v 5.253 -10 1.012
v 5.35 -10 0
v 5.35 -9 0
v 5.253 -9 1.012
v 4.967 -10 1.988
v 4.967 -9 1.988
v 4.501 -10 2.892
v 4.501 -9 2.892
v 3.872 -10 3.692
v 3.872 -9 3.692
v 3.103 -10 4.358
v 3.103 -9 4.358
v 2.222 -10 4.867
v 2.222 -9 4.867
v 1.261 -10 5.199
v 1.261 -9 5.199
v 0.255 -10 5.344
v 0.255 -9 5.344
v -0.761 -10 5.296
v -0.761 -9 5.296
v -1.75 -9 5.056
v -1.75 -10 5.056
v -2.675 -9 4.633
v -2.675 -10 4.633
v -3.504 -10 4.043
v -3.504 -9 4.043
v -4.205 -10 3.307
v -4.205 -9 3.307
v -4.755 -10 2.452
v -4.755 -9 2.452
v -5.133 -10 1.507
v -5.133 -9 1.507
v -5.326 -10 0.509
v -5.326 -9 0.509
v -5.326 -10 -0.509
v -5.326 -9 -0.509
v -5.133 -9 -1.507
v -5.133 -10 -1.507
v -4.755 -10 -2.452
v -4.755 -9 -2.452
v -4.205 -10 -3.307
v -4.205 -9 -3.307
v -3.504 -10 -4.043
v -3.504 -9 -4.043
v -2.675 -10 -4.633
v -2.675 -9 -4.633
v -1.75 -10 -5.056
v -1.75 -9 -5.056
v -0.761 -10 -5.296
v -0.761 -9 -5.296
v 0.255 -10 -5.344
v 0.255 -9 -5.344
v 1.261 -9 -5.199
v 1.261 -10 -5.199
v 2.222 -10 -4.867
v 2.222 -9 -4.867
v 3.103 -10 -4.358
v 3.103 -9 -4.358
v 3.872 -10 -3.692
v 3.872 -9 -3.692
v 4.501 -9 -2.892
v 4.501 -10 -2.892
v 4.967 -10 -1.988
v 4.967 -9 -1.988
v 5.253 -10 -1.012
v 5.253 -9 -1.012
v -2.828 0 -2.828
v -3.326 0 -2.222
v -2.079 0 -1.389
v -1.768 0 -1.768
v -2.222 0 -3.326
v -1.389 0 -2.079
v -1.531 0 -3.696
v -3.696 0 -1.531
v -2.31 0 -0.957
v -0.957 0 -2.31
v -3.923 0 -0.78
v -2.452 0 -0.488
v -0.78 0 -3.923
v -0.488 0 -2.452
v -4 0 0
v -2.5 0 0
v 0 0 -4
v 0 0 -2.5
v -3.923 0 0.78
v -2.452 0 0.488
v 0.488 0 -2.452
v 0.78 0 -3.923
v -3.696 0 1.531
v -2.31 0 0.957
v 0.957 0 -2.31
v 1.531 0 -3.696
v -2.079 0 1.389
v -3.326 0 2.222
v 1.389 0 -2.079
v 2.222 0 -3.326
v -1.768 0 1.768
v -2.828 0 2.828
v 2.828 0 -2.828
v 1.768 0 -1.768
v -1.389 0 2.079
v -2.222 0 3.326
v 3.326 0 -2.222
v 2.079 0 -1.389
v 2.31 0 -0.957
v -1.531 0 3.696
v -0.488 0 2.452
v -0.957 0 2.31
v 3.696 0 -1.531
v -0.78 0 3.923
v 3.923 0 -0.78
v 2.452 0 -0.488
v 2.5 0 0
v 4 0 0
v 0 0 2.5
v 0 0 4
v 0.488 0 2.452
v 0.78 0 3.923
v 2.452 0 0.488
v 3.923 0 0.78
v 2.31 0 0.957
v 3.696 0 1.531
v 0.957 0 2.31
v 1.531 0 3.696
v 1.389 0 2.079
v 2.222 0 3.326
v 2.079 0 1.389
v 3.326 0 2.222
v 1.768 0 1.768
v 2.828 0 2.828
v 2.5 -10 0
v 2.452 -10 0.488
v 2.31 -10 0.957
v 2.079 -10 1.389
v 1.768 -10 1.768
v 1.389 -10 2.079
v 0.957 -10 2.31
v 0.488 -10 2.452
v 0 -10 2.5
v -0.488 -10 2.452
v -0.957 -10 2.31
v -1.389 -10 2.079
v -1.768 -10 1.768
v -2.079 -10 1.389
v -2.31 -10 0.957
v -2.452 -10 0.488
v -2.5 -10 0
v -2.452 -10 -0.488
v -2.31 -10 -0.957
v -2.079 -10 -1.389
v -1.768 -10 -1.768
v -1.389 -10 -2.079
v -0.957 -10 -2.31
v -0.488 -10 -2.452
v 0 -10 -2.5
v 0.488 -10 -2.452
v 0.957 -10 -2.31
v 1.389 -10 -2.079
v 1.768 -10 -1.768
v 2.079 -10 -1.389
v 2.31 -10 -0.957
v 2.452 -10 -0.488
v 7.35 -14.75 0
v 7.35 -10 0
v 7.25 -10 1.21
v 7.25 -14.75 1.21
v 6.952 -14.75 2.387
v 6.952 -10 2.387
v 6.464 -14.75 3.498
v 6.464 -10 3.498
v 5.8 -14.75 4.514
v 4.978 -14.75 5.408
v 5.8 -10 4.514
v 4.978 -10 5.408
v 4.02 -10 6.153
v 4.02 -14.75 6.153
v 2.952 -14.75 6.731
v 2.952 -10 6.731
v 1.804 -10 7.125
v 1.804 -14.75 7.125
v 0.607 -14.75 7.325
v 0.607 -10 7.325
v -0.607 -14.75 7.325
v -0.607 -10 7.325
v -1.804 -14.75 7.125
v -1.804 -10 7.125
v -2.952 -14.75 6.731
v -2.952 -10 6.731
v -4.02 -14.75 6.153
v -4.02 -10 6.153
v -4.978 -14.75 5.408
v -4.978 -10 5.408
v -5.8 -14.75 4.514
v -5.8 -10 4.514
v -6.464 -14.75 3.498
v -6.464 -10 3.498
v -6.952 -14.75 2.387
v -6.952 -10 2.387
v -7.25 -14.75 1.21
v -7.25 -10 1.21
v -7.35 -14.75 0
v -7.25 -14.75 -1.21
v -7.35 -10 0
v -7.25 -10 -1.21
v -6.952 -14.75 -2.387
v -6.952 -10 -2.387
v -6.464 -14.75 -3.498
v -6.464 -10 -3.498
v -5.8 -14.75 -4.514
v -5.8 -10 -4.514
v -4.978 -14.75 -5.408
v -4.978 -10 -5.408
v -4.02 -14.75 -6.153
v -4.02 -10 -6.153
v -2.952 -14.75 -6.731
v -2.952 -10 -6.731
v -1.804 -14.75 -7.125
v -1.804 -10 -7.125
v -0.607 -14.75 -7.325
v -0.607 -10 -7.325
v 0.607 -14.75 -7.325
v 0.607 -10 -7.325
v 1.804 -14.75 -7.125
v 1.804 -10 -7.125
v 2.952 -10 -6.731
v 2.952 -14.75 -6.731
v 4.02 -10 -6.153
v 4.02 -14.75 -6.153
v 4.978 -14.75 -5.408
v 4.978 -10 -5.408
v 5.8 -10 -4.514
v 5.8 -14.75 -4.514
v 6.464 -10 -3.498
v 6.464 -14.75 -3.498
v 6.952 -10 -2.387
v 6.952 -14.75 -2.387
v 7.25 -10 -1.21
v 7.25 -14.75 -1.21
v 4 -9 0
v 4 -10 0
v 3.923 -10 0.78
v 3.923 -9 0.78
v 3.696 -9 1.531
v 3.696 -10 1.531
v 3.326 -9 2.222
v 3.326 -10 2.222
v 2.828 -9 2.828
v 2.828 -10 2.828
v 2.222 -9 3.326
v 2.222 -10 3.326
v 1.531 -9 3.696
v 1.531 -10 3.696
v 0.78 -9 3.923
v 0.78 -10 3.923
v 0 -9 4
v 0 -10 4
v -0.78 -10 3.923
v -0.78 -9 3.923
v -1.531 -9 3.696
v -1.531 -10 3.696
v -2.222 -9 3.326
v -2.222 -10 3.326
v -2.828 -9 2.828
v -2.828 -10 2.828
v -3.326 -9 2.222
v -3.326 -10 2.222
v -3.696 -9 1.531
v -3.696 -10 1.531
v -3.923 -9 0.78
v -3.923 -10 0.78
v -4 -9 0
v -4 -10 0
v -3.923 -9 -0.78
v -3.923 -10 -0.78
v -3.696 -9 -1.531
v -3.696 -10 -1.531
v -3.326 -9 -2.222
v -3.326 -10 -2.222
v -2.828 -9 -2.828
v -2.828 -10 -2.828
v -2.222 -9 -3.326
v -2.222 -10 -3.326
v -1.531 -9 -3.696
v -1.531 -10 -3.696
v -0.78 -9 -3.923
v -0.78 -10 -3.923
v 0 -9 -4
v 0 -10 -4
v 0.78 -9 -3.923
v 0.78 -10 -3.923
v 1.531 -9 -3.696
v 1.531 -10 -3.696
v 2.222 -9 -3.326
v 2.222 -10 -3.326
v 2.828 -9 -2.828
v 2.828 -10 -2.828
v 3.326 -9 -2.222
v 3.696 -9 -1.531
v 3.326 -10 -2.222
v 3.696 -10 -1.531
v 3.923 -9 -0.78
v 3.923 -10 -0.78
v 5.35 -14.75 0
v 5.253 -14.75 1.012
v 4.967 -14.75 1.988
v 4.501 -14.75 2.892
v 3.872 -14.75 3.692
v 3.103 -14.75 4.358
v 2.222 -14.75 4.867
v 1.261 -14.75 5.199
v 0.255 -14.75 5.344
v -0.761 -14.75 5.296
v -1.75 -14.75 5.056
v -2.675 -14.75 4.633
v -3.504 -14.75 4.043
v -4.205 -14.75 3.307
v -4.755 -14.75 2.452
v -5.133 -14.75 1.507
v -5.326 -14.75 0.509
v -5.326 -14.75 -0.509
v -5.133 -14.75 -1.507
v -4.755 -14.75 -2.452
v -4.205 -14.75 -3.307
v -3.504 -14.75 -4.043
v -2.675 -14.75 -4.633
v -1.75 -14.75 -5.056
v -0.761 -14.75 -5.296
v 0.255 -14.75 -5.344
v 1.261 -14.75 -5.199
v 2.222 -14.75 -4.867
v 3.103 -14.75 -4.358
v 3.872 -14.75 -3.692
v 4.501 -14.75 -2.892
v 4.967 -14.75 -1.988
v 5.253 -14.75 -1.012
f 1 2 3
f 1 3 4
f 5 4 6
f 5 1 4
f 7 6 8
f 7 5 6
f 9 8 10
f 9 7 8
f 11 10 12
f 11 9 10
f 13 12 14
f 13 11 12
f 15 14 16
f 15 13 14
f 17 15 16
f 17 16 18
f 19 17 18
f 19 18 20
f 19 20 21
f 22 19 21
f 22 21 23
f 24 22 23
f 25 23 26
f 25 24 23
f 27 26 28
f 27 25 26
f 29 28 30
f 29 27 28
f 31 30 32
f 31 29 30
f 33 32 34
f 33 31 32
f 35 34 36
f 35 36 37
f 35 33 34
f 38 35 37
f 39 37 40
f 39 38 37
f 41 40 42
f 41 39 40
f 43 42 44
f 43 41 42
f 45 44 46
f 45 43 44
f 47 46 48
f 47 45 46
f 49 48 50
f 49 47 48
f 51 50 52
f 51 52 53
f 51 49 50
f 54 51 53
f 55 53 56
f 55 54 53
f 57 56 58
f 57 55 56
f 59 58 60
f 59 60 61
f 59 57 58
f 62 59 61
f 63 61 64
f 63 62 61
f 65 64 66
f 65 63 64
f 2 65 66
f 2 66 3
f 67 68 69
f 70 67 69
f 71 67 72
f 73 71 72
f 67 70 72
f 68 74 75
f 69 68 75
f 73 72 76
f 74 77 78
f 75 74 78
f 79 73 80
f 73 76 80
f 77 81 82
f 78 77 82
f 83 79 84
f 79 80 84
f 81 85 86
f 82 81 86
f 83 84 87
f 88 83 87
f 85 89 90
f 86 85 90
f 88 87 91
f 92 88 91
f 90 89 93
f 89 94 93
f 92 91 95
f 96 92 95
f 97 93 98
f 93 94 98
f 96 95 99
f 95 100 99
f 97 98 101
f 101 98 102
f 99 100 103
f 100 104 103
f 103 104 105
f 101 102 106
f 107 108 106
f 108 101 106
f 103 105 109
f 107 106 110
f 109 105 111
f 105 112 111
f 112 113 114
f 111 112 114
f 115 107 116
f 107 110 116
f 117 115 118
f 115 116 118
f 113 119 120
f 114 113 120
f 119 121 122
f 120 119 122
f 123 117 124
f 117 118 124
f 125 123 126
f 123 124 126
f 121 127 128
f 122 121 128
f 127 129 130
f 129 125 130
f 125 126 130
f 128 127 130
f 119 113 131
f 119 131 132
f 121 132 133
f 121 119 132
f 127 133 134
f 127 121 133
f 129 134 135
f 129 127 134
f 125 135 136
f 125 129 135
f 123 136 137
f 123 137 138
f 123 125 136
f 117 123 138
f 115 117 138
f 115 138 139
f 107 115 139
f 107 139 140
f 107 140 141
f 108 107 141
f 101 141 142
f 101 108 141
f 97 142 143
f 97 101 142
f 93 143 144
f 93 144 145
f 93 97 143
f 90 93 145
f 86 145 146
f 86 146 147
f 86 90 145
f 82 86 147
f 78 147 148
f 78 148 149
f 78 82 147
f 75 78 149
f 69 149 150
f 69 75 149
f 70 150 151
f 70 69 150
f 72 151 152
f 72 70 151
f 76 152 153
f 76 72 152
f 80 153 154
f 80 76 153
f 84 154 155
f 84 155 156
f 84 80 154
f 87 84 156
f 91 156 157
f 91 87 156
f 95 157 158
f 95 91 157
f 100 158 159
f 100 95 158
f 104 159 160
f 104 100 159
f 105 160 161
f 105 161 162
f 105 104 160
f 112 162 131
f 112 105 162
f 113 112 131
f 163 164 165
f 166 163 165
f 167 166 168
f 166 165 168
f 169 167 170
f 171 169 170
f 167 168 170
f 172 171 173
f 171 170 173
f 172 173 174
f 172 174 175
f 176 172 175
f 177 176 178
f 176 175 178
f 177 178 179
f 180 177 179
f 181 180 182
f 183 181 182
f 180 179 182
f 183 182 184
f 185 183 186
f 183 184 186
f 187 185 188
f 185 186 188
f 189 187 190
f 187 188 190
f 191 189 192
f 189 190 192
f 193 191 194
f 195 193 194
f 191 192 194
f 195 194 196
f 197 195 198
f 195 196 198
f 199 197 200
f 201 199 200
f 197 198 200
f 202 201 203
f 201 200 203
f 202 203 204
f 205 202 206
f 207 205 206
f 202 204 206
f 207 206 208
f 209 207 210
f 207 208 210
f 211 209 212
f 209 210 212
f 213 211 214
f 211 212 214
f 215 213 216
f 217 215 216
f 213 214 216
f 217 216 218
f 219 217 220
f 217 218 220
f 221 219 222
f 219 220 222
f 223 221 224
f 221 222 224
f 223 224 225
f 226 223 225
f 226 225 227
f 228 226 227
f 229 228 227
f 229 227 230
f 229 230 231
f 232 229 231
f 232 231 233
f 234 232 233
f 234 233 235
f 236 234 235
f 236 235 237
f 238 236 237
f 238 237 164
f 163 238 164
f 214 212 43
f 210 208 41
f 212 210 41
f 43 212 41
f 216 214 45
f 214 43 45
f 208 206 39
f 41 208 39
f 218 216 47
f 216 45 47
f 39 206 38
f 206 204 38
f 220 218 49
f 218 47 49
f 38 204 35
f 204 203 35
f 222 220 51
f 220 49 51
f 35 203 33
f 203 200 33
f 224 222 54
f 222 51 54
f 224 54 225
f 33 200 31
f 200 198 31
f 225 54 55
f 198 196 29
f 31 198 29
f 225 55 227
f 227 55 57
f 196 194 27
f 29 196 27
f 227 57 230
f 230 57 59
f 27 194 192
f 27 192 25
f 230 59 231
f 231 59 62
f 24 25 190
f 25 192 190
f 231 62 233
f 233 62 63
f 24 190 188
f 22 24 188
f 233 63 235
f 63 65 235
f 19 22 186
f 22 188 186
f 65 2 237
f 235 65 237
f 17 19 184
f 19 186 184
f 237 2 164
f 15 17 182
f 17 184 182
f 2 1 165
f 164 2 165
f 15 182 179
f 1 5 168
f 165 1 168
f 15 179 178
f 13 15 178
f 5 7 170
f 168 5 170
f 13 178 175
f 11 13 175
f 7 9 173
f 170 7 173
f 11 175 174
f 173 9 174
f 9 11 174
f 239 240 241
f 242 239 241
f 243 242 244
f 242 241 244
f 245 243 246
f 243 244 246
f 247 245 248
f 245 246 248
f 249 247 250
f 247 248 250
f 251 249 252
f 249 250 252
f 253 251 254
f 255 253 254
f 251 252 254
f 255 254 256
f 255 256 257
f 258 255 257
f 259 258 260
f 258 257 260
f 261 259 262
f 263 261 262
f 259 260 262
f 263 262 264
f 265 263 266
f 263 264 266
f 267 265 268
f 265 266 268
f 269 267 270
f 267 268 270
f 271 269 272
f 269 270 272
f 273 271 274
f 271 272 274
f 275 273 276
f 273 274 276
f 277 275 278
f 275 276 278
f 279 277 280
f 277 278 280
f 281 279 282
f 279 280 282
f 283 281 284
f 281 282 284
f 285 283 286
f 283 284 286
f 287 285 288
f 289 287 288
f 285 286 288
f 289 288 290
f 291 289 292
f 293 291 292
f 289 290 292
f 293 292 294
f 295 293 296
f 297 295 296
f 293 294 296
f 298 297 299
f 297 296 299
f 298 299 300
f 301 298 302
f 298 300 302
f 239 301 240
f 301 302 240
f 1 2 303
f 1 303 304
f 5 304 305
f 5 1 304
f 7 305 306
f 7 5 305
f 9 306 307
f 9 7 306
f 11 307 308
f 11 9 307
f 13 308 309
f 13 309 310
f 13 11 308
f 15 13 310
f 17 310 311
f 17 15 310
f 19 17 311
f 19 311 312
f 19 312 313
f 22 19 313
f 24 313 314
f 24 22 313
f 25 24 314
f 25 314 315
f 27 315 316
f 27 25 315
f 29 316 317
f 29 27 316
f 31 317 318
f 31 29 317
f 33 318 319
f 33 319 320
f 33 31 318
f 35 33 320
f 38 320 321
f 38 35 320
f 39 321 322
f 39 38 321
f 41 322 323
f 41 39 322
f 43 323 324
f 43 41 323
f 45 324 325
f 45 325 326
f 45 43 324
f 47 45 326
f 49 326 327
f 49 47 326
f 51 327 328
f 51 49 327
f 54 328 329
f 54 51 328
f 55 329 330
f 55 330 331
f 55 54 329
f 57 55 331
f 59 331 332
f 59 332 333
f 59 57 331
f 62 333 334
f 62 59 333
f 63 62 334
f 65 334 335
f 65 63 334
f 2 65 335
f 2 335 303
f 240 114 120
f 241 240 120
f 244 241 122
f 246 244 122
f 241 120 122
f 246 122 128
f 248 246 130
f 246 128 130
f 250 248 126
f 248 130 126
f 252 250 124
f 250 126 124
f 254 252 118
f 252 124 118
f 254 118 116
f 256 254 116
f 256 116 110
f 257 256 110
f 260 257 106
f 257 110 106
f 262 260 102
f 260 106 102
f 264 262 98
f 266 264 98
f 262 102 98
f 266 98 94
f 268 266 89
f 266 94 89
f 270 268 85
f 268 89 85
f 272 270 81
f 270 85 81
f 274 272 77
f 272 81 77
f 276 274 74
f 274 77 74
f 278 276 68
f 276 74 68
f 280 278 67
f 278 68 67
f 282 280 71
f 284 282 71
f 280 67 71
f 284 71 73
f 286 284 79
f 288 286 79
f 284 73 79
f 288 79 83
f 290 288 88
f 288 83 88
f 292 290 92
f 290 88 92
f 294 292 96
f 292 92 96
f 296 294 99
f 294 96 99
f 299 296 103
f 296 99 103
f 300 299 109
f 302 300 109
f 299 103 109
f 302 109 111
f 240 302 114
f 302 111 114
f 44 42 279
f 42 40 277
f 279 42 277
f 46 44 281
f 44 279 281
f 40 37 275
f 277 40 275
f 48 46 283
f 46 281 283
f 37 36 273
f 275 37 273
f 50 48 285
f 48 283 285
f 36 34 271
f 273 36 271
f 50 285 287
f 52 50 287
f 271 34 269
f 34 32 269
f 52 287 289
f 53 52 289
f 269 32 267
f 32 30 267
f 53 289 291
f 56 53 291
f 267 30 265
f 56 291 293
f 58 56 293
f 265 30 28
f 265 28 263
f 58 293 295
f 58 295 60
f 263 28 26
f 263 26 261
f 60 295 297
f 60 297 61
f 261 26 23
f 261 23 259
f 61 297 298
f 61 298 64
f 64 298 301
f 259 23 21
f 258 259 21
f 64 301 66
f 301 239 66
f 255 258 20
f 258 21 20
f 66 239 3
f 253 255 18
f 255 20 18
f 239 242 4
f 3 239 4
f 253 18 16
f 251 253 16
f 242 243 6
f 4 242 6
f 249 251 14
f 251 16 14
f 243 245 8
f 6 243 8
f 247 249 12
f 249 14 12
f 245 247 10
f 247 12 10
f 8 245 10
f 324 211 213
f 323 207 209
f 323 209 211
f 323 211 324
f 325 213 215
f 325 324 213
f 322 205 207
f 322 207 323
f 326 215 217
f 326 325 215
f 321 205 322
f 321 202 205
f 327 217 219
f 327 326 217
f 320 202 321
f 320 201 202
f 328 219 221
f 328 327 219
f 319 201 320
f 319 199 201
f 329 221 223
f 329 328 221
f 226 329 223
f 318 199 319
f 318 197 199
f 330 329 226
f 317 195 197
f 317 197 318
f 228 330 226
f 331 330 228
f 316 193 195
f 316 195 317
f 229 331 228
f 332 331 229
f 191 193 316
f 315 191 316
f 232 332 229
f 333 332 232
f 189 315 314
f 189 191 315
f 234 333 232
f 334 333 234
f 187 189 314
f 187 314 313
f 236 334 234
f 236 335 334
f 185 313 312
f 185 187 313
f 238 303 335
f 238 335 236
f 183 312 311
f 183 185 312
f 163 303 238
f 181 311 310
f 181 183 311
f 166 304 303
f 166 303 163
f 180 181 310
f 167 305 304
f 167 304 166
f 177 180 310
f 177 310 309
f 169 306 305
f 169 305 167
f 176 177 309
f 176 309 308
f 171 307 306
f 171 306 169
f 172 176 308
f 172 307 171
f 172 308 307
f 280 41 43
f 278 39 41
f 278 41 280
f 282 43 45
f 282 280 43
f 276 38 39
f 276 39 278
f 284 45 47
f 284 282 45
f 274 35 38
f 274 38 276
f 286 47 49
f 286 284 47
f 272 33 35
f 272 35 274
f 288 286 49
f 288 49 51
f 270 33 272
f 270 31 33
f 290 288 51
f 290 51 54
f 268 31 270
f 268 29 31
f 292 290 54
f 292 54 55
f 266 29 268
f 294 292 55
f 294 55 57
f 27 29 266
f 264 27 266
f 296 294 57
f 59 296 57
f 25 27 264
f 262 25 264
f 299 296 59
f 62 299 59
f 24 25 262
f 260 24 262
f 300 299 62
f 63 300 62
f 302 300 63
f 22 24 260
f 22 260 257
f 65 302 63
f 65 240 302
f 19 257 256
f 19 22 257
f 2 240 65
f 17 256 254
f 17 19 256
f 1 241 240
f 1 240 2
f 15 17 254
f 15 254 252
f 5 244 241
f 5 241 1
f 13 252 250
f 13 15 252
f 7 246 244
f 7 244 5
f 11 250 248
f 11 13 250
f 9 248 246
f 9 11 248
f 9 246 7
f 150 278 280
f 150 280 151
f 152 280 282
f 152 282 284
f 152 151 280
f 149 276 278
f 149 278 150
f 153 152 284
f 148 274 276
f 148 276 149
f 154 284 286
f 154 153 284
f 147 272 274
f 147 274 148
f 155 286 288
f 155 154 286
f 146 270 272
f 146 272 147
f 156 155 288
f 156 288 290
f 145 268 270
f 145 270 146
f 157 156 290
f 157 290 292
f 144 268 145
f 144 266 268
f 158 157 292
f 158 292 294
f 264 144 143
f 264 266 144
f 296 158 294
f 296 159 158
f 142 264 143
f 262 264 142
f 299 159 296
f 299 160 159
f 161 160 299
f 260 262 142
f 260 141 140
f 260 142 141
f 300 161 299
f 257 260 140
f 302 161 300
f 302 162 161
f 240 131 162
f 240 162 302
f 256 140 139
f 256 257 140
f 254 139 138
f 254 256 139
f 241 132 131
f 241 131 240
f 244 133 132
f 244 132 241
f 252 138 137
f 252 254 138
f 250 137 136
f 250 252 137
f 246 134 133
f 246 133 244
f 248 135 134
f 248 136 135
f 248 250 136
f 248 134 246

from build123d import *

# Parameters (mm, degrees)
F0_R     = 4
F0_R_2   = 2.5
F1_DEPTH = 10
F2_R     = 7.35
F2_R_2   = 5.35
F3_DEPTH = 4.75
F2_R_3   = 4
F4_DEPTH = 1


with BuildPart() as f1:
    # F0 (on Front) → F1 (new body)
    with BuildSketch(Plane.XZ):
        Circle(F0_R)
        Circle(F0_R_2, mode=Mode.SUBTRACT)
    extrude(amount=F1_DEPTH)


with BuildPart() as f3:
    # F2 (on face) → F3 (new body)
    with BuildSketch(Plane.XZ.offset(10)):
        Circle(F2_R)
        Circle(F2_R_2, mode=Mode.SUBTRACT)
    extrude(amount=F3_DEPTH)


with BuildPart() as f4:
    # F2 (on face) → F4 (new body)
    with BuildSketch(Plane.XZ.offset(10)):
        Circle(F2_R_2)
        Circle(F2_R_3, mode=Mode.SUBTRACT)
    extrude(amount=-F4_DEPTH)


solid = Compound([f1.part, f3.part, f4.part])
